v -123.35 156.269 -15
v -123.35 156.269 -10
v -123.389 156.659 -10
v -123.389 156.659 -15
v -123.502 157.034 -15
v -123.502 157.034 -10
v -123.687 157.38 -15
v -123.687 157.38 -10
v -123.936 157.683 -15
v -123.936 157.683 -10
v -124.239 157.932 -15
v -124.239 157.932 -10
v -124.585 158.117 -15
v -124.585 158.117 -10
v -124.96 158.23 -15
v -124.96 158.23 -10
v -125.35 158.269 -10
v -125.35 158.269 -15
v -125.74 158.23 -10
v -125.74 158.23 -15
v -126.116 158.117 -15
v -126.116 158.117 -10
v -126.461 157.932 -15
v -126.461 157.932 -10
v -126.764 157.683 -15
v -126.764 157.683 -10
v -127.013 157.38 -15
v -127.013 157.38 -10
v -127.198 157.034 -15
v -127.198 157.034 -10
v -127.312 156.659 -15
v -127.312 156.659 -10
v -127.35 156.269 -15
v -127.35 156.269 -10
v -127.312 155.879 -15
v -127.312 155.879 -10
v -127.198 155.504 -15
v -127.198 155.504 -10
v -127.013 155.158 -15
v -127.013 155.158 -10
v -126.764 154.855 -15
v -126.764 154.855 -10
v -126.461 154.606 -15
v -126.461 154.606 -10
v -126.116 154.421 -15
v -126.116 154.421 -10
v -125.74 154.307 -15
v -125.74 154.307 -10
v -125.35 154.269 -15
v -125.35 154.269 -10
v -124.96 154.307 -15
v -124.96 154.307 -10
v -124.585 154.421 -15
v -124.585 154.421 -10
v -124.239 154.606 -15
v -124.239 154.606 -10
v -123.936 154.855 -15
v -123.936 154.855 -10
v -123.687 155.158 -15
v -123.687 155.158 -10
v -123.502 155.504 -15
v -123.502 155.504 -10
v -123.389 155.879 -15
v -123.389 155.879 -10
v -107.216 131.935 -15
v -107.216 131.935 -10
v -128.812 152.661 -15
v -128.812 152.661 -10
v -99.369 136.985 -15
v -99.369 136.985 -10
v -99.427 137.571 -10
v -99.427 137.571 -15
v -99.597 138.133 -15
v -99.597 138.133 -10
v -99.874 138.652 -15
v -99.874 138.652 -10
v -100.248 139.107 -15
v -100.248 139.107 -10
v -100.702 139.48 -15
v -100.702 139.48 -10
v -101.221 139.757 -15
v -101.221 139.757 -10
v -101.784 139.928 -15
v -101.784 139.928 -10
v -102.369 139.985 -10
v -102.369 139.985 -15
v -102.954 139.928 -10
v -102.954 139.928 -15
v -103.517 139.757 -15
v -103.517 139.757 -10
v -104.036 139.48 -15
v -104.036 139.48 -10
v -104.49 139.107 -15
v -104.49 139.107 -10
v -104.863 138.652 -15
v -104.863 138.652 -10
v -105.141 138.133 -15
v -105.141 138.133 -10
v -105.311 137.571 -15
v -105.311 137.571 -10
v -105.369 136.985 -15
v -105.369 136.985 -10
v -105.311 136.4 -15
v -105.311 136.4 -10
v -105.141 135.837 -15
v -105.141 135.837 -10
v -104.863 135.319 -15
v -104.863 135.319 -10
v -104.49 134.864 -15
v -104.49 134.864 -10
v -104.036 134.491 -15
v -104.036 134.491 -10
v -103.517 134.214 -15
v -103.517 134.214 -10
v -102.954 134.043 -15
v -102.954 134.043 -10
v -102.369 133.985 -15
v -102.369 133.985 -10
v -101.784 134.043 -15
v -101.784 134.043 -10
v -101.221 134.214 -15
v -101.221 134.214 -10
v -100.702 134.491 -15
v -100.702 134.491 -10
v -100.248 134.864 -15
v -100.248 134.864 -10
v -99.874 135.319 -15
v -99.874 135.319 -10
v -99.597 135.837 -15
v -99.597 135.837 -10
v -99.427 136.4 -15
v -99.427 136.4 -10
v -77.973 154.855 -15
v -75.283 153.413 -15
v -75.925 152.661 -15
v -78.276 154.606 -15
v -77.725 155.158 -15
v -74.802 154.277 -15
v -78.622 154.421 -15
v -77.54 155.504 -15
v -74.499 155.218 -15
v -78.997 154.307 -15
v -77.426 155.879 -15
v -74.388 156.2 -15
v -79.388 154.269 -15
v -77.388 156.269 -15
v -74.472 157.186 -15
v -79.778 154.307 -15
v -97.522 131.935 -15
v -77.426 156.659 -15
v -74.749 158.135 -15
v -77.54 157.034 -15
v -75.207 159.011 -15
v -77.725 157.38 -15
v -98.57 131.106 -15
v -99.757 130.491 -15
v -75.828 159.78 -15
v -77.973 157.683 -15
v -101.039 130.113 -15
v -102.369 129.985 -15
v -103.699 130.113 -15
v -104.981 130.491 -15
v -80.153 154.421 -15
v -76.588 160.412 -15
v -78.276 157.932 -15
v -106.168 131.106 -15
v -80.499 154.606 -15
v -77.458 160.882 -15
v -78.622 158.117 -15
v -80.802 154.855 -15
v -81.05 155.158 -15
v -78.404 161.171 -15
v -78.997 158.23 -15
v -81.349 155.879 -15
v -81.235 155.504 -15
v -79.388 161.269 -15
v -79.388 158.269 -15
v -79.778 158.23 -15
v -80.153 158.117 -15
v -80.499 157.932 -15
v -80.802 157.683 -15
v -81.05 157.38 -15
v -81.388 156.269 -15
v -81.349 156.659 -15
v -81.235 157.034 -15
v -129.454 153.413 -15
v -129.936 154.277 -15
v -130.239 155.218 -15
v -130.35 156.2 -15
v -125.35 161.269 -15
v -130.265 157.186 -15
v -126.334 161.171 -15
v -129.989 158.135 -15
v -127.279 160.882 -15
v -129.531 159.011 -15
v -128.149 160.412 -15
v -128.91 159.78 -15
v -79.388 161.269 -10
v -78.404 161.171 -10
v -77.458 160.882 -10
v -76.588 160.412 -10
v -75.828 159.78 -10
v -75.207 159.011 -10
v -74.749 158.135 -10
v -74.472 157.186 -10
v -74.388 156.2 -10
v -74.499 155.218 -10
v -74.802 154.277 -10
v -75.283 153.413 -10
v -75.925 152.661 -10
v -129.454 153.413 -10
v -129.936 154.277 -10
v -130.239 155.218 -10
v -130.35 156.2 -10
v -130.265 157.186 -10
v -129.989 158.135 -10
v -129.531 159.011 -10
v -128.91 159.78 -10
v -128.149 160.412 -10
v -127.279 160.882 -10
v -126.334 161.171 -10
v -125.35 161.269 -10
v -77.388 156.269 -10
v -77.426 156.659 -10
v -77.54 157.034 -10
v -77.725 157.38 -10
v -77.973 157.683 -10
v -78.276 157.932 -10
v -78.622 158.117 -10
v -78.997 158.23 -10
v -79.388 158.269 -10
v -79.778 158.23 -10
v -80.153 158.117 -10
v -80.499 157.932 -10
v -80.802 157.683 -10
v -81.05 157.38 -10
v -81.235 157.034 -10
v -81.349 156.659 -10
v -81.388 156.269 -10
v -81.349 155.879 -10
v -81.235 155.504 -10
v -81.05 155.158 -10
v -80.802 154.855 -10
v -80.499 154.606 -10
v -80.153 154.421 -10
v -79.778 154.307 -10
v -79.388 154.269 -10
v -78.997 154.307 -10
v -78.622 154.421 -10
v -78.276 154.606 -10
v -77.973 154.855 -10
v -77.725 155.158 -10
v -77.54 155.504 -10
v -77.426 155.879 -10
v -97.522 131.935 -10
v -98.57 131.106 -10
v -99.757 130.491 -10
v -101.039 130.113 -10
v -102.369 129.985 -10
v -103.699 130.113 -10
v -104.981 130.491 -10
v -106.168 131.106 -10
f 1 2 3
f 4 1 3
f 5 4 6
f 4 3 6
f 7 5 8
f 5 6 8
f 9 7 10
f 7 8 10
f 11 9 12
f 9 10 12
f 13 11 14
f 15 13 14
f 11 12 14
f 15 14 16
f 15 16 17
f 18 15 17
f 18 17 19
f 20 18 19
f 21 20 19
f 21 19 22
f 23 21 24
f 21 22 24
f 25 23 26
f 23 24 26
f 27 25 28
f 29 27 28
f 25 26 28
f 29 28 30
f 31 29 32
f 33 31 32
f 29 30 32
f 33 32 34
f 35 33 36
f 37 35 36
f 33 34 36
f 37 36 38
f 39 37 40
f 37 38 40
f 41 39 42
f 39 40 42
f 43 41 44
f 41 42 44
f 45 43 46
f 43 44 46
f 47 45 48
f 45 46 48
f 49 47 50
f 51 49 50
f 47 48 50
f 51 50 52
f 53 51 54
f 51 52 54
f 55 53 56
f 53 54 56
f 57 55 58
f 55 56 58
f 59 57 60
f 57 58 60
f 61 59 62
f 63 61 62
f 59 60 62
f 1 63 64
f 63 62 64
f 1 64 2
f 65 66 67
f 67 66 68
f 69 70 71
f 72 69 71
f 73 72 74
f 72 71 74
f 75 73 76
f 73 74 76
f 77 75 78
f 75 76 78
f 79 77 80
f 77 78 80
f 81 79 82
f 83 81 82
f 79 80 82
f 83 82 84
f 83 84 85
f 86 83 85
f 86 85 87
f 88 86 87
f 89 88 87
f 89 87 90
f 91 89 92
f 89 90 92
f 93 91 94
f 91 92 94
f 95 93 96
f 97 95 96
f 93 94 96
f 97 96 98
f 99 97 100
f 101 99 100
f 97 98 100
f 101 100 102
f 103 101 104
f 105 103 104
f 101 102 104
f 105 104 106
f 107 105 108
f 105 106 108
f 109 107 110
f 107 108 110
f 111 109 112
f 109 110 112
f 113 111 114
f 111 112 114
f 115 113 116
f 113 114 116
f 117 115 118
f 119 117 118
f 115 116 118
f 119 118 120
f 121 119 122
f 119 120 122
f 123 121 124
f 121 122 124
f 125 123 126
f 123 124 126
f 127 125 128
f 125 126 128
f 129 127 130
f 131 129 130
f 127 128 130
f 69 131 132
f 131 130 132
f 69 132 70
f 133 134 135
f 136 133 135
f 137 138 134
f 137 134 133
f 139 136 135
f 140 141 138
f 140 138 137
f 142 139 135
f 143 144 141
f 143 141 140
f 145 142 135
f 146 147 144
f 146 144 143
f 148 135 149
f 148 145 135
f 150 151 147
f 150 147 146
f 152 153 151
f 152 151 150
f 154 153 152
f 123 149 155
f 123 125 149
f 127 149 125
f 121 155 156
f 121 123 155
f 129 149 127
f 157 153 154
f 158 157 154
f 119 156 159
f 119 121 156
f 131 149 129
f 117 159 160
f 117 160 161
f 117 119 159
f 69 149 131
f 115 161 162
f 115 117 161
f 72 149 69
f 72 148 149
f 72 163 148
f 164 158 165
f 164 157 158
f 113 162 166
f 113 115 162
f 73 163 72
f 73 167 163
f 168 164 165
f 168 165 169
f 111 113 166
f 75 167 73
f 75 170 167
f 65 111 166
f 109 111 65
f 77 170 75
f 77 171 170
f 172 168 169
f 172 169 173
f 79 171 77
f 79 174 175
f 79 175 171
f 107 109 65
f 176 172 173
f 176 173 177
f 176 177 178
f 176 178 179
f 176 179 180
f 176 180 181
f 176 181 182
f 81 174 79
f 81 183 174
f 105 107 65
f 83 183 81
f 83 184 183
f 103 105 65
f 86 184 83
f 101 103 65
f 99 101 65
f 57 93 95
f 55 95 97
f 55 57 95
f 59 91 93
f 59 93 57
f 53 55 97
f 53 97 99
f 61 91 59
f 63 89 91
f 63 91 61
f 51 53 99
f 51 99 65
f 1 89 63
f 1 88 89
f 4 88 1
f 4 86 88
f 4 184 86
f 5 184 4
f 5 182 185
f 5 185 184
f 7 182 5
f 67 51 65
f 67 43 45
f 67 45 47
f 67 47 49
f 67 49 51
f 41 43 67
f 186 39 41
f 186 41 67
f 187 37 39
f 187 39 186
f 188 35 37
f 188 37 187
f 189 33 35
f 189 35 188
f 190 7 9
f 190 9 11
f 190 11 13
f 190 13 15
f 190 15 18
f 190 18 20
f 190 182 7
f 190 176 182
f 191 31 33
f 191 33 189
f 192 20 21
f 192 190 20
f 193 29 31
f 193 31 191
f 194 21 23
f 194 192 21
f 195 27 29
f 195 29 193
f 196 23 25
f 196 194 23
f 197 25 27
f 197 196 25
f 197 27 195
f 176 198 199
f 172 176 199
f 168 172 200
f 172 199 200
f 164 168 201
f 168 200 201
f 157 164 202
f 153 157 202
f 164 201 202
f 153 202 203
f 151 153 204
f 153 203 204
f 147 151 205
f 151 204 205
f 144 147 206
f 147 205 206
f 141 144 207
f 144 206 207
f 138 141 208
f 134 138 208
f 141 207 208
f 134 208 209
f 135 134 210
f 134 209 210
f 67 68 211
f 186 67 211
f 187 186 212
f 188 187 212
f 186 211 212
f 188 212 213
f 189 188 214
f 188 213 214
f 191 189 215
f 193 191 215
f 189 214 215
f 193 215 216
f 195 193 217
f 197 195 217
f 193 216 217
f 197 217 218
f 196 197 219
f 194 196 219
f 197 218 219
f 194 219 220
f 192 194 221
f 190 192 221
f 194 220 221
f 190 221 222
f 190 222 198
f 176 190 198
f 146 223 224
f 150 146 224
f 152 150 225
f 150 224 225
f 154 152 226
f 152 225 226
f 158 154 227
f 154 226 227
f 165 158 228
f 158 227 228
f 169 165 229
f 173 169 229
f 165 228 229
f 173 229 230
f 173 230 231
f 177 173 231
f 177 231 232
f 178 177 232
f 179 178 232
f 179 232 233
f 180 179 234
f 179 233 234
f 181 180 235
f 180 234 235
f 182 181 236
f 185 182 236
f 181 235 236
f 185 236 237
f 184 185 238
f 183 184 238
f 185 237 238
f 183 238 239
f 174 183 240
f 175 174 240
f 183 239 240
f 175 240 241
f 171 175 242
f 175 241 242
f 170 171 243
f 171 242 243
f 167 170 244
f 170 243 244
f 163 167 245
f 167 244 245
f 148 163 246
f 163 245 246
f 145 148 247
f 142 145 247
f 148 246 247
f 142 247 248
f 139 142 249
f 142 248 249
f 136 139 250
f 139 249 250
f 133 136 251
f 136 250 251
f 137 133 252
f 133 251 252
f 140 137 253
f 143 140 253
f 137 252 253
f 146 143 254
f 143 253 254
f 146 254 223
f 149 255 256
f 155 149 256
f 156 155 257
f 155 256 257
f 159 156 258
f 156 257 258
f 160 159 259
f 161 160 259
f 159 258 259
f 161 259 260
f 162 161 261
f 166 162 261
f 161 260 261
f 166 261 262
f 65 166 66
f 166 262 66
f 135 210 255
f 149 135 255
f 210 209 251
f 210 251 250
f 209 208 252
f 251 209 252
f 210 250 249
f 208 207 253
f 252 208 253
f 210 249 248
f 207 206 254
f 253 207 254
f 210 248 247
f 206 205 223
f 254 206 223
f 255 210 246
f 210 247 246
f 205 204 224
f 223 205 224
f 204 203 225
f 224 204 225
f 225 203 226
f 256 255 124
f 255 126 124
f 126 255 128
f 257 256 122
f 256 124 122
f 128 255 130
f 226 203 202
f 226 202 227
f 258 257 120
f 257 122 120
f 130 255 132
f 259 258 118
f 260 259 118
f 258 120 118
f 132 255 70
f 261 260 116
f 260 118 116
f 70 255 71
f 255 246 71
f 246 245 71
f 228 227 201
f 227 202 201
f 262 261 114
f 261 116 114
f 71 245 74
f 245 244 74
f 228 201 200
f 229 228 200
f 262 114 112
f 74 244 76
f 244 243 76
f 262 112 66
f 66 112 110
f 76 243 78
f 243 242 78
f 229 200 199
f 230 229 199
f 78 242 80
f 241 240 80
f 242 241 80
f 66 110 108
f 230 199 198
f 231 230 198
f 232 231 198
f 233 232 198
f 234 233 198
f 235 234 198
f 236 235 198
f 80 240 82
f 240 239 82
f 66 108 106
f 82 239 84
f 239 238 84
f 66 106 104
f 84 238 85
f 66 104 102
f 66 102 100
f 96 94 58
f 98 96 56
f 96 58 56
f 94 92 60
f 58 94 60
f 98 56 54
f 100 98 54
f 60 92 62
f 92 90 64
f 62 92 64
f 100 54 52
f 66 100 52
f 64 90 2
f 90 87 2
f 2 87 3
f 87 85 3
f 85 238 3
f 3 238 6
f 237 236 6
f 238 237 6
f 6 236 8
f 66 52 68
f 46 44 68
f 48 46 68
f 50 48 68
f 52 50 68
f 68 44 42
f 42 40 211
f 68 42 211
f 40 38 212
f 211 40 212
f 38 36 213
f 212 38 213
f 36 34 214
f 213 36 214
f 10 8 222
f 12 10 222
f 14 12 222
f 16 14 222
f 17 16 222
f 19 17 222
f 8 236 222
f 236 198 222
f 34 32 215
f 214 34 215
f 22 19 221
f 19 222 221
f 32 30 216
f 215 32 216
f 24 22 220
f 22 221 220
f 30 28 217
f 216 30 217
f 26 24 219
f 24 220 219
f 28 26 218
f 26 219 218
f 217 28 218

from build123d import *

# Parameters (mm, degrees)
BOSS_EXTRUDE1_START = -10
SKETCH1_R           = 3
SKETCH1_R_2         = 2
BOSS_EXTRUDE1_DEPTH = 5


with BuildPart() as part:
    # Sketch1 → Boss-Extrude1 (new body)
    with BuildSketch(Plane.XY.offset(BOSS_EXTRUDE1_START)):
        with BuildLine():
            Line((-125.350212025, 161.26892377), (-79.387545438, 161.26892377))
            ThreePointArc((-79.387545438, 161.26892377), (-74.748731312, 158.134775723), (-75.92540928, 152.661485175))
            Line((-75.92540928, 152.661485175), (-97.52188811, 131.934881446))
            ThreePointArc((-97.52188811, 131.934881446), (-102.368878731, 129.98529548), (-107.215869353, 131.934881446))
            Line((-107.215869353, 131.934881446), (-128.812348183, 152.661485175))
            ThreePointArc((-128.812348183, 152.661485175), (-129.98902615, 158.134775723), (-125.350212025, 161.26892377))
        make_face()
        with Locations((-102.368878731, 136.98529548)):
            Circle(SKETCH1_R, mode=Mode.SUBTRACT)
        with Locations((-79.387545438, 156.26892377)):
            Circle(SKETCH1_R_2, mode=Mode.SUBTRACT)
        with Locations((-125.350212025, 156.26892377)):
            Circle(SKETCH1_R_2, mode=Mode.SUBTRACT)
    extrude(amount=-BOSS_EXTRUDE1_DEPTH)


solid = part.part
